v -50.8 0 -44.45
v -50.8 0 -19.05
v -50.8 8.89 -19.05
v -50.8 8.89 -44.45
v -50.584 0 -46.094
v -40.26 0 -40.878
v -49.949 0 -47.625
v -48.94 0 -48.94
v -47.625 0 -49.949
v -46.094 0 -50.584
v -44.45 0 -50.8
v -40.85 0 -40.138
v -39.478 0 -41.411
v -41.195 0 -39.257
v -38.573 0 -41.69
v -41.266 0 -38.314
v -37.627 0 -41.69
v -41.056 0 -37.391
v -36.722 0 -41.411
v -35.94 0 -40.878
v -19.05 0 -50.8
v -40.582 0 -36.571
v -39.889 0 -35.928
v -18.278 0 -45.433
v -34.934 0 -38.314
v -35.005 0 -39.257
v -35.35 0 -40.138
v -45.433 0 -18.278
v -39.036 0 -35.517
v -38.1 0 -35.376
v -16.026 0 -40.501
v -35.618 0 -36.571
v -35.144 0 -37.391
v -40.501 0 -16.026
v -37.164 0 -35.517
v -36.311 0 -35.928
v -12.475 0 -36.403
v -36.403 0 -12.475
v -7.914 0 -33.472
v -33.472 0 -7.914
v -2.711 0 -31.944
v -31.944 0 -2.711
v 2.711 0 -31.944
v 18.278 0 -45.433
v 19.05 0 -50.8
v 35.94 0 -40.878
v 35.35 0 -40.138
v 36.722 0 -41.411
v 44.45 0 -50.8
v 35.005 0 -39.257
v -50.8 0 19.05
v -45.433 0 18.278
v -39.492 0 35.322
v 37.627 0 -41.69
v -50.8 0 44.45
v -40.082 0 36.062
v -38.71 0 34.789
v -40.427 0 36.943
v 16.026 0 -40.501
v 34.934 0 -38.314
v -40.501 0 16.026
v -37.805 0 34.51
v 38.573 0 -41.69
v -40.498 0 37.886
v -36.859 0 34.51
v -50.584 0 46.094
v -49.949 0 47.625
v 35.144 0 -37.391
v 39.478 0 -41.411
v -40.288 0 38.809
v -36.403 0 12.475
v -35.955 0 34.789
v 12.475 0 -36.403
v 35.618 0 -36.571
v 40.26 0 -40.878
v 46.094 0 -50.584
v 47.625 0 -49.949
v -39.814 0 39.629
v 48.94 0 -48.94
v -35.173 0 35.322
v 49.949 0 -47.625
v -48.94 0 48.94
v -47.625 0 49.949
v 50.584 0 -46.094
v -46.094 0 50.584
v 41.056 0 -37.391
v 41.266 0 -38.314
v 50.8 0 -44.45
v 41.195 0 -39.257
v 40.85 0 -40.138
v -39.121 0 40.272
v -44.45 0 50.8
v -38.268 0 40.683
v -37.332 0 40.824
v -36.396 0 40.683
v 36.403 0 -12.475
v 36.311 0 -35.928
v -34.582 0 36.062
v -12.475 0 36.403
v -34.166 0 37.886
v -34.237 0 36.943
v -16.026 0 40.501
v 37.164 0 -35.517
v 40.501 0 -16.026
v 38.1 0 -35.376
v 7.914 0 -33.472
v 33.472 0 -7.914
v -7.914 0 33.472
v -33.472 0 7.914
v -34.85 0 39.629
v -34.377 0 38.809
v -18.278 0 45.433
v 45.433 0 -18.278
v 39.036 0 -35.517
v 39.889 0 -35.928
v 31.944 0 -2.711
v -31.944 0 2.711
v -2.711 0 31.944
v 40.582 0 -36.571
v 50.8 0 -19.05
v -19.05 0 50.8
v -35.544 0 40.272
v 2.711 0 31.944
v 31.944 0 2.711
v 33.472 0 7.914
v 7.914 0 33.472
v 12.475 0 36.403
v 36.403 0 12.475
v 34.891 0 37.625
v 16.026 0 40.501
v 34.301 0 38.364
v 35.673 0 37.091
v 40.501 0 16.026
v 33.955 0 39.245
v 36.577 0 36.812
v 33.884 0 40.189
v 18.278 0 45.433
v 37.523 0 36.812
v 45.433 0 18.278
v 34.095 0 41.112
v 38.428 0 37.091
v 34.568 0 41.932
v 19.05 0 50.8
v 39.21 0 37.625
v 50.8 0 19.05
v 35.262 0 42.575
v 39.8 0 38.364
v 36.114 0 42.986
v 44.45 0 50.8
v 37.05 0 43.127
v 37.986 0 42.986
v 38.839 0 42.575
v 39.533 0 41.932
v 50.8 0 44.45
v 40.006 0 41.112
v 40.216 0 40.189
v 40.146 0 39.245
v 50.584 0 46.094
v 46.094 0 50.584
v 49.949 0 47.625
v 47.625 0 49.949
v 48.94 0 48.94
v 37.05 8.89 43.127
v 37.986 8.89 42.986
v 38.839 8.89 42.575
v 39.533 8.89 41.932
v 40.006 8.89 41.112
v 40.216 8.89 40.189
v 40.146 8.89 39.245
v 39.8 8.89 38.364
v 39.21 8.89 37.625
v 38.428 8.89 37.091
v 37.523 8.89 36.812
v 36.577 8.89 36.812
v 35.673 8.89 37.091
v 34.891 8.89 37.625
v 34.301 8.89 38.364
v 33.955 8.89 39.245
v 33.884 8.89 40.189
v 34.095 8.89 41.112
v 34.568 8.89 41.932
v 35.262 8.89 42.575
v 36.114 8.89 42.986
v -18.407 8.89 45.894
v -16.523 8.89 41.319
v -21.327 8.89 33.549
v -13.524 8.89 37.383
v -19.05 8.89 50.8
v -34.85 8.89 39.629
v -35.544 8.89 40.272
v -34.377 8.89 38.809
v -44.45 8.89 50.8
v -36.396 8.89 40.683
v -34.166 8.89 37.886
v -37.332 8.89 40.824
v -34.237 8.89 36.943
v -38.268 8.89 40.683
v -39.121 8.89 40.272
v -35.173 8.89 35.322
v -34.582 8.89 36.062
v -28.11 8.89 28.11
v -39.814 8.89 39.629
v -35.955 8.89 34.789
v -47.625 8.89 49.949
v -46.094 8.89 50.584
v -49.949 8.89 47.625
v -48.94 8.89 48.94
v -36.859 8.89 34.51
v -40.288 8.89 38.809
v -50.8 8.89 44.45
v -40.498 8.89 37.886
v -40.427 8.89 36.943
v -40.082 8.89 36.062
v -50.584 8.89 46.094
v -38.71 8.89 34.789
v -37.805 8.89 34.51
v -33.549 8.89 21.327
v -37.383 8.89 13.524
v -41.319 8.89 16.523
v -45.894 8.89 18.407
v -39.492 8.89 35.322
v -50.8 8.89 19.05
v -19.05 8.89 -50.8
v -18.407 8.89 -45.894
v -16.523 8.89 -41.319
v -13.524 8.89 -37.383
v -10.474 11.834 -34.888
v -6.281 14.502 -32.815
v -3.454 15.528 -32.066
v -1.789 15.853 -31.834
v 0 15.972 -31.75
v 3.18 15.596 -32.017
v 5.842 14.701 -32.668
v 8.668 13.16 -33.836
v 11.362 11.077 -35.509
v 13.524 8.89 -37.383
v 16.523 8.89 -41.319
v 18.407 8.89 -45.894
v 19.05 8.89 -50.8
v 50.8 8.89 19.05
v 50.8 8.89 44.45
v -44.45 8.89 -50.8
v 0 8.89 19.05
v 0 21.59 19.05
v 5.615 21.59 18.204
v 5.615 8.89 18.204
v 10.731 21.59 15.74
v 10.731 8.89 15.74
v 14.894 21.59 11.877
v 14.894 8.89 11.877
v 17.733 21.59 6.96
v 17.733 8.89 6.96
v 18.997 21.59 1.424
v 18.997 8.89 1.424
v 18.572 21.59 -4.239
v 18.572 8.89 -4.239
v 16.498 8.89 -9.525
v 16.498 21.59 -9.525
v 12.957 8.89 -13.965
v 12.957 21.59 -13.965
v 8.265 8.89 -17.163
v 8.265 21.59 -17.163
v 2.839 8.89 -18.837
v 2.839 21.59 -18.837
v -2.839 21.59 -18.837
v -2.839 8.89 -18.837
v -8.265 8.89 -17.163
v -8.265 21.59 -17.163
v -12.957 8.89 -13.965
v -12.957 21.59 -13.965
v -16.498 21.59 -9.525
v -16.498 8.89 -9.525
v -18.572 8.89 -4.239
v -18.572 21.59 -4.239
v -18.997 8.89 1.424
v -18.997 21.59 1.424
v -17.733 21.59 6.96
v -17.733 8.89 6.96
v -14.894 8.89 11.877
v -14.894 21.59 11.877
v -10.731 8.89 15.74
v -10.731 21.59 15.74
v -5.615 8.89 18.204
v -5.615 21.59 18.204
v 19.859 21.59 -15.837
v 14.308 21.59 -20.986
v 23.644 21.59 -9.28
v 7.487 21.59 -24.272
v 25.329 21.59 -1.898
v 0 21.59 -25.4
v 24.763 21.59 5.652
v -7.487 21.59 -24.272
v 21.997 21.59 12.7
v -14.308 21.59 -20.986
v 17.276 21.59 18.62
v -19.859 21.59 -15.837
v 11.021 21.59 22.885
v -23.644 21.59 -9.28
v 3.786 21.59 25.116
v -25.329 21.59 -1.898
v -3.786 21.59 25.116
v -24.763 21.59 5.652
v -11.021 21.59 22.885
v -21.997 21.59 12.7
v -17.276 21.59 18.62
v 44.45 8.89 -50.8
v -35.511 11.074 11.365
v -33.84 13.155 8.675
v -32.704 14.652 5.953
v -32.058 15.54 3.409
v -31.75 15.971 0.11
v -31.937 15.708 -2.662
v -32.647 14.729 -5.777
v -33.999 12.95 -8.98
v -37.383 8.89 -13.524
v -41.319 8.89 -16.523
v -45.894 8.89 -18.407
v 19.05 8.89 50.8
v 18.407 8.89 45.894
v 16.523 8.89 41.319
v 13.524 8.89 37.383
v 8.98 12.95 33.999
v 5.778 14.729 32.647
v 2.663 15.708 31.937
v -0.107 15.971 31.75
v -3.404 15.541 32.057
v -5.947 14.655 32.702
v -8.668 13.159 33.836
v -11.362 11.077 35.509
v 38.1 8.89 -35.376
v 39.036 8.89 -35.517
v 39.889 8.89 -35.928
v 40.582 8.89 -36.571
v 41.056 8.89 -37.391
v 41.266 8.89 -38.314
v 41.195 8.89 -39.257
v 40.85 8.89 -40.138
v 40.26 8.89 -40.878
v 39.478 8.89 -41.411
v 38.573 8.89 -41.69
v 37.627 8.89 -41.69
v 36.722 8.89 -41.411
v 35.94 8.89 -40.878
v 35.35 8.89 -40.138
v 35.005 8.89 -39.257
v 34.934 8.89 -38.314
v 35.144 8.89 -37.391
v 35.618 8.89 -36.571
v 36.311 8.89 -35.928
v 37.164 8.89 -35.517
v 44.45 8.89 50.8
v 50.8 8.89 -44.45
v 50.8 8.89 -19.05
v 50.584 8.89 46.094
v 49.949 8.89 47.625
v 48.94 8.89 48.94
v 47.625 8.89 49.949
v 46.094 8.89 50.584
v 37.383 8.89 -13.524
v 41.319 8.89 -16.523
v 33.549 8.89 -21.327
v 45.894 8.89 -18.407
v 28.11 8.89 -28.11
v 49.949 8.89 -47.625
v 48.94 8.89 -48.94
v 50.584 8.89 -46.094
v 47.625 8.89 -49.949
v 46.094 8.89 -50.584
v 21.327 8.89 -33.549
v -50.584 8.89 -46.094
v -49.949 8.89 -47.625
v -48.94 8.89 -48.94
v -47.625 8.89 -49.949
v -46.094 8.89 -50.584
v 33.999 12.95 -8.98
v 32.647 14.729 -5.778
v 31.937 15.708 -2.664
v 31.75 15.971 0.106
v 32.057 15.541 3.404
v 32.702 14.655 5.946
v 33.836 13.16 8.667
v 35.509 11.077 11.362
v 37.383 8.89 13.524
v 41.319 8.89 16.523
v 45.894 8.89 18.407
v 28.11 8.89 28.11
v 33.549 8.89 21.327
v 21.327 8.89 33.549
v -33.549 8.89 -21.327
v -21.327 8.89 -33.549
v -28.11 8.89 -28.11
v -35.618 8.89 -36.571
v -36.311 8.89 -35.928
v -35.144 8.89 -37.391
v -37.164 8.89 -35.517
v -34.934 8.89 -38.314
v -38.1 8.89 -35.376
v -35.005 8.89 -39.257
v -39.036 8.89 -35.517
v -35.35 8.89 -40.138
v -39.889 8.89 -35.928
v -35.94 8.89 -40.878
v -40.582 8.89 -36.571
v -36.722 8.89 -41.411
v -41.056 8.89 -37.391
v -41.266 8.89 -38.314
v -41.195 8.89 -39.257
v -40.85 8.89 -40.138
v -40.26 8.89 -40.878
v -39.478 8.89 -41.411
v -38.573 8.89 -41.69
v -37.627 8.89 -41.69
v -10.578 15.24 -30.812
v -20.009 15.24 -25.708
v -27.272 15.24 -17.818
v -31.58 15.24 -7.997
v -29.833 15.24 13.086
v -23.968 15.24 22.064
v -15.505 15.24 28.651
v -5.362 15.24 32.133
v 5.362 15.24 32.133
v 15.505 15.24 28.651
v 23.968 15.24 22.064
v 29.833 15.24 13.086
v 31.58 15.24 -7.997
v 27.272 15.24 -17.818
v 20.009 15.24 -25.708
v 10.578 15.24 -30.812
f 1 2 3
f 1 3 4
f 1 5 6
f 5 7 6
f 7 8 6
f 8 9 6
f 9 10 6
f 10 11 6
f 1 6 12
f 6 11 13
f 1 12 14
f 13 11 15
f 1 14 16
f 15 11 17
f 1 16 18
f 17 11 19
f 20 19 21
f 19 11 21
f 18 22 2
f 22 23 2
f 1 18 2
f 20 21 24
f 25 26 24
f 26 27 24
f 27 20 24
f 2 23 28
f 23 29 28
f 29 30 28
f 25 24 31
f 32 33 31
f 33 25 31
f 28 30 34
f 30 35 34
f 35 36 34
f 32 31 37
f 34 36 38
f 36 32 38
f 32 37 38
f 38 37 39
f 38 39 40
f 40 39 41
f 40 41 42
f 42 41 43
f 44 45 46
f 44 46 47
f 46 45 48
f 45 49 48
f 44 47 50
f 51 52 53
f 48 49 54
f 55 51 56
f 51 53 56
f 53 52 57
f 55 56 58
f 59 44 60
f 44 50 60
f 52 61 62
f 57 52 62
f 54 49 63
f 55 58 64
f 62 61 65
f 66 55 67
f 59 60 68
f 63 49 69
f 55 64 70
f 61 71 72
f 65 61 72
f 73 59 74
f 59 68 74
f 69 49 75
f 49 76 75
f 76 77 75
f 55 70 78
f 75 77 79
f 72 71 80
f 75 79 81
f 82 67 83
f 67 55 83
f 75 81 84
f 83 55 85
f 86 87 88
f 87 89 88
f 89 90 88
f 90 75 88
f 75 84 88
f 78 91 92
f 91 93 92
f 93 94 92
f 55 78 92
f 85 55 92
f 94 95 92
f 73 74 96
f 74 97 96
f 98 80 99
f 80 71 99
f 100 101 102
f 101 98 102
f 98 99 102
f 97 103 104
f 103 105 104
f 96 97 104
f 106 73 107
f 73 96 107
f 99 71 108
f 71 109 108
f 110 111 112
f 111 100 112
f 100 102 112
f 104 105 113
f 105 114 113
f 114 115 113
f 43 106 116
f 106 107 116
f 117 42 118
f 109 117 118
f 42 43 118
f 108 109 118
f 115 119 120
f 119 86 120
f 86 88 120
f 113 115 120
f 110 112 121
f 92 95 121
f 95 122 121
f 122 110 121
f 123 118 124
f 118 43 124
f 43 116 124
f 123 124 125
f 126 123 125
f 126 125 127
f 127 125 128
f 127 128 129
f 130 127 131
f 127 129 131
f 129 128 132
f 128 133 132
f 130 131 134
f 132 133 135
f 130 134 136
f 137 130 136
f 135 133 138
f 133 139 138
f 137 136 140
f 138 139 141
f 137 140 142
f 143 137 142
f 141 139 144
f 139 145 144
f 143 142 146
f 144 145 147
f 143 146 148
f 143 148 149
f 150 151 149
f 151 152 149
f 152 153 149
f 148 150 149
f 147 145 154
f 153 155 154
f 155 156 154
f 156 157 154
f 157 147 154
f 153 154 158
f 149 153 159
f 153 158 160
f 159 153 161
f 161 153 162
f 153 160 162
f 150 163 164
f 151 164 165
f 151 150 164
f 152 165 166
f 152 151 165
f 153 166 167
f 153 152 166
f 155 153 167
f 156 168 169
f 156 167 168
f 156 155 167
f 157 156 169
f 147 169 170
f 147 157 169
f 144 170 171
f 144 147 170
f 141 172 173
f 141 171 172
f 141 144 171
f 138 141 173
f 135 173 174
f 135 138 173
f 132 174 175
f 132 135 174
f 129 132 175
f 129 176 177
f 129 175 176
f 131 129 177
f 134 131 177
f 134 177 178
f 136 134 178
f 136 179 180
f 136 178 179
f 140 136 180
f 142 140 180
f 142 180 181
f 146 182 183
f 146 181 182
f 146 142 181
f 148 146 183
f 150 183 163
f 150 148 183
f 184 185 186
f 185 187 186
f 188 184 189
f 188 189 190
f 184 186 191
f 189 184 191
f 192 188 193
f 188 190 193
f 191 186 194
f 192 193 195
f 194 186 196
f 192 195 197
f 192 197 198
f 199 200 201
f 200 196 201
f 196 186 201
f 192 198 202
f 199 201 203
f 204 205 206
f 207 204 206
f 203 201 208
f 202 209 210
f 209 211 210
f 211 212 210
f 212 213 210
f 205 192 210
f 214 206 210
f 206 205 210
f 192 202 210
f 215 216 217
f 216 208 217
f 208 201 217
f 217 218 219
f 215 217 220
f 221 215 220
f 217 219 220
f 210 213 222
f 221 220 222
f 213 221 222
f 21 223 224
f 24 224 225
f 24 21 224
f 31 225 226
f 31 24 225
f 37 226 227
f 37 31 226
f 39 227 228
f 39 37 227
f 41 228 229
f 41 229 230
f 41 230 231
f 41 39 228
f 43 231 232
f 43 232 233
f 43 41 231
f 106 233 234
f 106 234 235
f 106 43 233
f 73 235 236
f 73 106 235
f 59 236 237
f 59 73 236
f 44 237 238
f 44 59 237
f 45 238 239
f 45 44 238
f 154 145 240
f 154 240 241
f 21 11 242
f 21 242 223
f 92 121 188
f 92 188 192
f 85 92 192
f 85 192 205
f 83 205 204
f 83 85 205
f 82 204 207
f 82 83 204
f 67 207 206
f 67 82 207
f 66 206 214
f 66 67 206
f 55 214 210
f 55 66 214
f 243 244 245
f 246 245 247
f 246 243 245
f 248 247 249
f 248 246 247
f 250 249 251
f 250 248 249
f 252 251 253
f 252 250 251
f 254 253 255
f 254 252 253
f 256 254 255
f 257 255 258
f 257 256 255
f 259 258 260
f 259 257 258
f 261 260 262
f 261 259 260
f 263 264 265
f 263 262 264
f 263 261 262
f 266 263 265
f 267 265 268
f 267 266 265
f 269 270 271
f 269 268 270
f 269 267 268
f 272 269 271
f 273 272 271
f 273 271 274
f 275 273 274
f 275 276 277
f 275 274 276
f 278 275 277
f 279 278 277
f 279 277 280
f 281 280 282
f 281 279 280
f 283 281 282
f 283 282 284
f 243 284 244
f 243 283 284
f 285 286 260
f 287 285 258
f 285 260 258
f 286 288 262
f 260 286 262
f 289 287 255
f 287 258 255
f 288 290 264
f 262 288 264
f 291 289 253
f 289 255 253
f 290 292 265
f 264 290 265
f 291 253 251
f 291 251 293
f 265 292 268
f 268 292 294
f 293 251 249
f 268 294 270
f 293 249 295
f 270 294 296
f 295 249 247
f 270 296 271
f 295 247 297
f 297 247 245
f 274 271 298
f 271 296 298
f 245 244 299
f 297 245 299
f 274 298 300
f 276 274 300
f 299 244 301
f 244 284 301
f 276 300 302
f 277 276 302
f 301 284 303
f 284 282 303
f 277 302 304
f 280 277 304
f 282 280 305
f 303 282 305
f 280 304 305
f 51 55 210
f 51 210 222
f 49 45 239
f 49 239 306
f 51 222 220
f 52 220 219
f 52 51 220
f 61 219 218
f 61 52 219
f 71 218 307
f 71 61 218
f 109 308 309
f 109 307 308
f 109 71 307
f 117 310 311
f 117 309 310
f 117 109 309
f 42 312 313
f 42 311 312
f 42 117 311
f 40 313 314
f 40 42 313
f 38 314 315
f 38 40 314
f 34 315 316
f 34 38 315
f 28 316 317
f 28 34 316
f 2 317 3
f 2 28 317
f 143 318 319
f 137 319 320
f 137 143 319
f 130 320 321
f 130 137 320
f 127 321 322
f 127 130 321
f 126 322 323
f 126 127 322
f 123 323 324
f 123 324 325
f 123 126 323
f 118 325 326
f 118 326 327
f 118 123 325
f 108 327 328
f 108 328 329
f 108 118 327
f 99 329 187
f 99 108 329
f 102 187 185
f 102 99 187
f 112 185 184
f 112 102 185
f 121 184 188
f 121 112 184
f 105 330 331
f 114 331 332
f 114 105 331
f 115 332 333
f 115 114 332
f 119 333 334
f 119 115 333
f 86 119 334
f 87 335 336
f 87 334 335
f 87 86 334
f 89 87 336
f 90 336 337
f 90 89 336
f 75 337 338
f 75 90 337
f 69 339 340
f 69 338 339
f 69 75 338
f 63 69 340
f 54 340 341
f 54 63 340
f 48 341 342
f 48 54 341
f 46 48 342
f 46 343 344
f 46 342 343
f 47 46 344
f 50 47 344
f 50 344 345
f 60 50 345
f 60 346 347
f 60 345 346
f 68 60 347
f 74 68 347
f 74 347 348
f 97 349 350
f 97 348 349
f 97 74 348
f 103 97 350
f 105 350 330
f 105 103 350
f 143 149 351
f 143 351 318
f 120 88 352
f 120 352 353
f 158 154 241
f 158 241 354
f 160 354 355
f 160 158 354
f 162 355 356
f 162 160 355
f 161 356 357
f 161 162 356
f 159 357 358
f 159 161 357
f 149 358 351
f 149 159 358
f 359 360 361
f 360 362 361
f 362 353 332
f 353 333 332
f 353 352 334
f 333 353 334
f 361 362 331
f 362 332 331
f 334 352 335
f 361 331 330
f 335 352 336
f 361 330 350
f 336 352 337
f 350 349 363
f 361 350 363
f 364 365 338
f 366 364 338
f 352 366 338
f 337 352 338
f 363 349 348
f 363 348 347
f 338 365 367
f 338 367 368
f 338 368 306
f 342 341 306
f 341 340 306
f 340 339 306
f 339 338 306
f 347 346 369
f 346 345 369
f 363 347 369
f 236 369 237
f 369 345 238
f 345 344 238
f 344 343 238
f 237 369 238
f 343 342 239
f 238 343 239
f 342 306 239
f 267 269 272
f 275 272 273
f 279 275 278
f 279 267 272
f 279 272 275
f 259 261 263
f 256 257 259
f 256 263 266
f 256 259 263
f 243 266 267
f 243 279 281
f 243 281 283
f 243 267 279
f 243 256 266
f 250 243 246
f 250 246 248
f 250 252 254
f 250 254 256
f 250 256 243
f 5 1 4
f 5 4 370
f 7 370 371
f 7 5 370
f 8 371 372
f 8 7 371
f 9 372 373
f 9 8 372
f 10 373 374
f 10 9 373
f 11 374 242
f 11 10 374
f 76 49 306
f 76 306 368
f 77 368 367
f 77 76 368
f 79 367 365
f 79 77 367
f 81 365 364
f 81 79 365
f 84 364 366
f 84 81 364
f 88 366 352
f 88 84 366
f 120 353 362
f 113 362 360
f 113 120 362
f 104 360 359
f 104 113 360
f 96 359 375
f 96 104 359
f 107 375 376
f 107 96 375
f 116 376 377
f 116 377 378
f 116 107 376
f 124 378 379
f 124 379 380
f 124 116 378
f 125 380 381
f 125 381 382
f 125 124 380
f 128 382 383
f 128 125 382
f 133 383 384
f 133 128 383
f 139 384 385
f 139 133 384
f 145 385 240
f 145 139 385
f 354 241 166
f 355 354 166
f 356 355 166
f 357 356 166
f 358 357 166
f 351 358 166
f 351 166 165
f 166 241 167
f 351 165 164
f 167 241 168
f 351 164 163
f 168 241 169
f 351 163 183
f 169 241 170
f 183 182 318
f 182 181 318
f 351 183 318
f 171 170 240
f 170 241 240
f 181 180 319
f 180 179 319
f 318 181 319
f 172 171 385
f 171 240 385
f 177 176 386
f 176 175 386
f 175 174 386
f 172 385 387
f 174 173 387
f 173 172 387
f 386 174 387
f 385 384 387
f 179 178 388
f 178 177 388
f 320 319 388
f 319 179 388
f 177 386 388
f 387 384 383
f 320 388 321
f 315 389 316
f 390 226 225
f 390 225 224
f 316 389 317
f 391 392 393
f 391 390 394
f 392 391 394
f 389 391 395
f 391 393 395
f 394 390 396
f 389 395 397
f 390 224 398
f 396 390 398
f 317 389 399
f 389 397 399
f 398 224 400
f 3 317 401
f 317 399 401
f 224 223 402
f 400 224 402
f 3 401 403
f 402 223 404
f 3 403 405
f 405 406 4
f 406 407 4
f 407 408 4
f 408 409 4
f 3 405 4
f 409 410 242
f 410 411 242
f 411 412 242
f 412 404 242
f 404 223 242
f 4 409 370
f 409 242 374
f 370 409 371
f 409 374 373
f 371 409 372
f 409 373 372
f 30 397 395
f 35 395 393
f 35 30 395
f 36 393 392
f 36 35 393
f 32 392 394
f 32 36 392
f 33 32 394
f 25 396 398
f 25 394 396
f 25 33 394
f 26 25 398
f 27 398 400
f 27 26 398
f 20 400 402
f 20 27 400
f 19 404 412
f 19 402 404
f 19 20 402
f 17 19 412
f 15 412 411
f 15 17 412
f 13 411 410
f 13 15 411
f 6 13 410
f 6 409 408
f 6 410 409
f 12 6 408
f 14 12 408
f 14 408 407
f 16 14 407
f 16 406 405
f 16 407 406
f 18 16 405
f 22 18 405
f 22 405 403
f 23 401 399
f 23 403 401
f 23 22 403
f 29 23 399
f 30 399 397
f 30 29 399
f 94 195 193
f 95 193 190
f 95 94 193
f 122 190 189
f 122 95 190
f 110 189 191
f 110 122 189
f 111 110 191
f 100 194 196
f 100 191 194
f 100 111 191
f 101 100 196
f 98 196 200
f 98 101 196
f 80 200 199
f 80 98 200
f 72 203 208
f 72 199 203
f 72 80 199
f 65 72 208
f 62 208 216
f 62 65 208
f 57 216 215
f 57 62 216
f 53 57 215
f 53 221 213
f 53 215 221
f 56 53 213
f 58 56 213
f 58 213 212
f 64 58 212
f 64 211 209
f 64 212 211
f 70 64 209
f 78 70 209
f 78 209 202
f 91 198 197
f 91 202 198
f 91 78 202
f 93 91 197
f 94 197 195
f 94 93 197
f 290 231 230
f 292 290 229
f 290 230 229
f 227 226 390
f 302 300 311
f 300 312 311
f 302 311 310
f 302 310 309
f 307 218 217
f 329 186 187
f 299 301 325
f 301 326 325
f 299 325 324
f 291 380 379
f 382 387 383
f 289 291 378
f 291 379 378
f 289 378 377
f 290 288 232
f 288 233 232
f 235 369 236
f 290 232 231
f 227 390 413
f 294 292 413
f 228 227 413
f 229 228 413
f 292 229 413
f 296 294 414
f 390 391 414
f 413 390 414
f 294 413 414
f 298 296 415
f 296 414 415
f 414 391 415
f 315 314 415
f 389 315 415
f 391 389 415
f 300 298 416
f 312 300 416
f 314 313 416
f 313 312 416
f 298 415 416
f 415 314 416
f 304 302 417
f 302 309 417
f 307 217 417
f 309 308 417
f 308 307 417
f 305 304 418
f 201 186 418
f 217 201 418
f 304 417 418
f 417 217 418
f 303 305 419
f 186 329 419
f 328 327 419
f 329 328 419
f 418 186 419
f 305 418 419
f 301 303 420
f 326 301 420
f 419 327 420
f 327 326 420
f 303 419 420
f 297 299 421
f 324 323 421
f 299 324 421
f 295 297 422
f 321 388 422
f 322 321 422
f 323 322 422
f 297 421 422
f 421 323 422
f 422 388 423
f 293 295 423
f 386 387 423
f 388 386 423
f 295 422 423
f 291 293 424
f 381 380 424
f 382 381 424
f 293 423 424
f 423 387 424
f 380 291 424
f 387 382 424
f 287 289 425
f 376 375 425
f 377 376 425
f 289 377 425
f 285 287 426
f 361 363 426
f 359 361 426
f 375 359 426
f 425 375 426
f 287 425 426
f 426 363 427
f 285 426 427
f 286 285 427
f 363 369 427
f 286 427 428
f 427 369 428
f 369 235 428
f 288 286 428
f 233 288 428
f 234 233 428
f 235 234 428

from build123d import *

# Parameters (mm, degrees)
BOSS_EXTRUDE1_DEPTH = 8.89
SKETCH3_R           = 19.05
SKETCH3_R_2         = 3.175
CUT_EXTRUDE5_DEPTH  = 59.944
SKETCH3_9_R         = 19.05
SKETCH3_9_R_2       = 3.175
CUT_EXTRUDE7_DEPTH  = 71.374
SKETCH3_12_R        = 19.05
BOSS_EXTRUDE2_DEPTH = 8.89


with BuildPart() as part:
    # Sketch1 → Boss-Extrude1 (new body)
    with BuildSketch(Plane(origin=(0, 0, 0), x_dir=(1, 0, 0), z_dir=(0, 1, 0))):
        with BuildLine():
            Line((-44.45, 50.8), (44.45, 50.8))
            ThreePointArc((44.45, 50.8), (48.940128061, 48.940128061), (50.8, 44.45))
            Line((50.8, 44.45), (50.8, -44.45))
            ThreePointArc((50.8, -44.45), (48.940128061, -48.940128061), (44.45, -50.8))
            Line((44.45, -50.8), (-44.45, -50.8))
            ThreePointArc((-44.45, -50.8), (-48.940128061, -48.940128061), (-50.8, -44.45))
            Line((-50.8, -44.45), (-50.8, 44.45))
            ThreePointArc((-50.8, 44.45), (-48.940128061, 48.940128061), (-44.45, 50.8))
        make_face()
    extrude(amount=BOSS_EXTRUDE1_DEPTH)

    # Sketch2 → Revolve1 (revolve)
    with BuildSketch(Plane.XY, mode=Mode.PRIVATE) as revolve1_sk:
        Polygon((0, 0), (0, 21.59), (25.4, 21.59), (41.275, 7.544465781), align=None)
    revolve(revolve1_sk.sketch.rotate(Axis((0, 0, 0), (0, 1, 0)), 90), axis=Axis((0, 0, 0), (0, 1, 0)))

    # Sketch3 → Cut-Extrude5 (cut)
    with BuildSketch(Plane(origin=(0, 0, 0), x_dir=(1, 0, 0), z_dir=(0, 1, 0))):
        with Locations((-50.8, 0)):
            Circle(SKETCH3_R)
        with Locations((50.8, 0)):
            Circle(SKETCH3_R)
        with Locations((0, 50.8)):
            Circle(SKETCH3_R)
        with Locations((0, -50.8)):
            Circle(SKETCH3_R)
        with Locations(Location((-38.1, 38.550826986, 0), (0, 0, 270))):
            Circle(SKETCH3_R_2)
        with Locations(Location((38.1, 38.550826986, 0), (0, 0, 270))):
            Circle(SKETCH3_R_2)
        with Locations(Location((37.0502476, -39.95194326, 0), (0, 0, 270))):
            Circle(SKETCH3_R_2)
        with Locations(Location((-37.332084064, -37.649173014, 0), (0, 0, 270))):
            Circle(SKETCH3_R_2)
    extrude(amount=CUT_EXTRUDE5_DEPTH, mode=Mode.SUBTRACT)

    # Sketch3<9> → Cut-Extrude7 (cut)
    with BuildSketch(Plane(origin=(0, 0, 0), x_dir=(1, 0, 0), z_dir=(0, 1, 0))):
        with Locations((-50.8, 0)):
            Circle(SKETCH3_9_R)
        with Locations(Location((0, 0, 0), (0, 0, 270))):
            Circle(SKETCH3_9_R)
        with Locations((50.8, 0)):
            Circle(SKETCH3_9_R)
        with Locations((0, 50.8)):
            Circle(SKETCH3_9_R)
        with Locations((0, -50.8)):
            Circle(SKETCH3_9_R)
        with Locations(Location((-38.1, 38.550826986, 0), (0, 0, 270))):
            Circle(SKETCH3_9_R_2)
        with Locations(Location((38.1, 38.550826986, 0), (0, 0, 270))):
            Circle(SKETCH3_9_R_2)
        with Locations(Location((37.0502476, -39.95194326, 0), (0, 0, 270))):
            Circle(SKETCH3_9_R_2)
        with Locations(Location((-37.332084064, -37.649173014, 0), (0, 0, 270))):
            Circle(SKETCH3_9_R_2)
    extrude(amount=CUT_EXTRUDE7_DEPTH, mode=Mode.SUBTRACT)

    # Sketch3<12> → Boss-Extrude2 (add)
    with BuildSketch(Plane(origin=(0, 0, 0), x_dir=(1, 0, 0), z_dir=(0, 1, 0))):
        with Locations(Location((0, 0, 0), (0, 0, 270))):
            Circle(SKETCH3_12_R)
    extrude(amount=BOSS_EXTRUDE2_DEPTH)


solid = part.part
